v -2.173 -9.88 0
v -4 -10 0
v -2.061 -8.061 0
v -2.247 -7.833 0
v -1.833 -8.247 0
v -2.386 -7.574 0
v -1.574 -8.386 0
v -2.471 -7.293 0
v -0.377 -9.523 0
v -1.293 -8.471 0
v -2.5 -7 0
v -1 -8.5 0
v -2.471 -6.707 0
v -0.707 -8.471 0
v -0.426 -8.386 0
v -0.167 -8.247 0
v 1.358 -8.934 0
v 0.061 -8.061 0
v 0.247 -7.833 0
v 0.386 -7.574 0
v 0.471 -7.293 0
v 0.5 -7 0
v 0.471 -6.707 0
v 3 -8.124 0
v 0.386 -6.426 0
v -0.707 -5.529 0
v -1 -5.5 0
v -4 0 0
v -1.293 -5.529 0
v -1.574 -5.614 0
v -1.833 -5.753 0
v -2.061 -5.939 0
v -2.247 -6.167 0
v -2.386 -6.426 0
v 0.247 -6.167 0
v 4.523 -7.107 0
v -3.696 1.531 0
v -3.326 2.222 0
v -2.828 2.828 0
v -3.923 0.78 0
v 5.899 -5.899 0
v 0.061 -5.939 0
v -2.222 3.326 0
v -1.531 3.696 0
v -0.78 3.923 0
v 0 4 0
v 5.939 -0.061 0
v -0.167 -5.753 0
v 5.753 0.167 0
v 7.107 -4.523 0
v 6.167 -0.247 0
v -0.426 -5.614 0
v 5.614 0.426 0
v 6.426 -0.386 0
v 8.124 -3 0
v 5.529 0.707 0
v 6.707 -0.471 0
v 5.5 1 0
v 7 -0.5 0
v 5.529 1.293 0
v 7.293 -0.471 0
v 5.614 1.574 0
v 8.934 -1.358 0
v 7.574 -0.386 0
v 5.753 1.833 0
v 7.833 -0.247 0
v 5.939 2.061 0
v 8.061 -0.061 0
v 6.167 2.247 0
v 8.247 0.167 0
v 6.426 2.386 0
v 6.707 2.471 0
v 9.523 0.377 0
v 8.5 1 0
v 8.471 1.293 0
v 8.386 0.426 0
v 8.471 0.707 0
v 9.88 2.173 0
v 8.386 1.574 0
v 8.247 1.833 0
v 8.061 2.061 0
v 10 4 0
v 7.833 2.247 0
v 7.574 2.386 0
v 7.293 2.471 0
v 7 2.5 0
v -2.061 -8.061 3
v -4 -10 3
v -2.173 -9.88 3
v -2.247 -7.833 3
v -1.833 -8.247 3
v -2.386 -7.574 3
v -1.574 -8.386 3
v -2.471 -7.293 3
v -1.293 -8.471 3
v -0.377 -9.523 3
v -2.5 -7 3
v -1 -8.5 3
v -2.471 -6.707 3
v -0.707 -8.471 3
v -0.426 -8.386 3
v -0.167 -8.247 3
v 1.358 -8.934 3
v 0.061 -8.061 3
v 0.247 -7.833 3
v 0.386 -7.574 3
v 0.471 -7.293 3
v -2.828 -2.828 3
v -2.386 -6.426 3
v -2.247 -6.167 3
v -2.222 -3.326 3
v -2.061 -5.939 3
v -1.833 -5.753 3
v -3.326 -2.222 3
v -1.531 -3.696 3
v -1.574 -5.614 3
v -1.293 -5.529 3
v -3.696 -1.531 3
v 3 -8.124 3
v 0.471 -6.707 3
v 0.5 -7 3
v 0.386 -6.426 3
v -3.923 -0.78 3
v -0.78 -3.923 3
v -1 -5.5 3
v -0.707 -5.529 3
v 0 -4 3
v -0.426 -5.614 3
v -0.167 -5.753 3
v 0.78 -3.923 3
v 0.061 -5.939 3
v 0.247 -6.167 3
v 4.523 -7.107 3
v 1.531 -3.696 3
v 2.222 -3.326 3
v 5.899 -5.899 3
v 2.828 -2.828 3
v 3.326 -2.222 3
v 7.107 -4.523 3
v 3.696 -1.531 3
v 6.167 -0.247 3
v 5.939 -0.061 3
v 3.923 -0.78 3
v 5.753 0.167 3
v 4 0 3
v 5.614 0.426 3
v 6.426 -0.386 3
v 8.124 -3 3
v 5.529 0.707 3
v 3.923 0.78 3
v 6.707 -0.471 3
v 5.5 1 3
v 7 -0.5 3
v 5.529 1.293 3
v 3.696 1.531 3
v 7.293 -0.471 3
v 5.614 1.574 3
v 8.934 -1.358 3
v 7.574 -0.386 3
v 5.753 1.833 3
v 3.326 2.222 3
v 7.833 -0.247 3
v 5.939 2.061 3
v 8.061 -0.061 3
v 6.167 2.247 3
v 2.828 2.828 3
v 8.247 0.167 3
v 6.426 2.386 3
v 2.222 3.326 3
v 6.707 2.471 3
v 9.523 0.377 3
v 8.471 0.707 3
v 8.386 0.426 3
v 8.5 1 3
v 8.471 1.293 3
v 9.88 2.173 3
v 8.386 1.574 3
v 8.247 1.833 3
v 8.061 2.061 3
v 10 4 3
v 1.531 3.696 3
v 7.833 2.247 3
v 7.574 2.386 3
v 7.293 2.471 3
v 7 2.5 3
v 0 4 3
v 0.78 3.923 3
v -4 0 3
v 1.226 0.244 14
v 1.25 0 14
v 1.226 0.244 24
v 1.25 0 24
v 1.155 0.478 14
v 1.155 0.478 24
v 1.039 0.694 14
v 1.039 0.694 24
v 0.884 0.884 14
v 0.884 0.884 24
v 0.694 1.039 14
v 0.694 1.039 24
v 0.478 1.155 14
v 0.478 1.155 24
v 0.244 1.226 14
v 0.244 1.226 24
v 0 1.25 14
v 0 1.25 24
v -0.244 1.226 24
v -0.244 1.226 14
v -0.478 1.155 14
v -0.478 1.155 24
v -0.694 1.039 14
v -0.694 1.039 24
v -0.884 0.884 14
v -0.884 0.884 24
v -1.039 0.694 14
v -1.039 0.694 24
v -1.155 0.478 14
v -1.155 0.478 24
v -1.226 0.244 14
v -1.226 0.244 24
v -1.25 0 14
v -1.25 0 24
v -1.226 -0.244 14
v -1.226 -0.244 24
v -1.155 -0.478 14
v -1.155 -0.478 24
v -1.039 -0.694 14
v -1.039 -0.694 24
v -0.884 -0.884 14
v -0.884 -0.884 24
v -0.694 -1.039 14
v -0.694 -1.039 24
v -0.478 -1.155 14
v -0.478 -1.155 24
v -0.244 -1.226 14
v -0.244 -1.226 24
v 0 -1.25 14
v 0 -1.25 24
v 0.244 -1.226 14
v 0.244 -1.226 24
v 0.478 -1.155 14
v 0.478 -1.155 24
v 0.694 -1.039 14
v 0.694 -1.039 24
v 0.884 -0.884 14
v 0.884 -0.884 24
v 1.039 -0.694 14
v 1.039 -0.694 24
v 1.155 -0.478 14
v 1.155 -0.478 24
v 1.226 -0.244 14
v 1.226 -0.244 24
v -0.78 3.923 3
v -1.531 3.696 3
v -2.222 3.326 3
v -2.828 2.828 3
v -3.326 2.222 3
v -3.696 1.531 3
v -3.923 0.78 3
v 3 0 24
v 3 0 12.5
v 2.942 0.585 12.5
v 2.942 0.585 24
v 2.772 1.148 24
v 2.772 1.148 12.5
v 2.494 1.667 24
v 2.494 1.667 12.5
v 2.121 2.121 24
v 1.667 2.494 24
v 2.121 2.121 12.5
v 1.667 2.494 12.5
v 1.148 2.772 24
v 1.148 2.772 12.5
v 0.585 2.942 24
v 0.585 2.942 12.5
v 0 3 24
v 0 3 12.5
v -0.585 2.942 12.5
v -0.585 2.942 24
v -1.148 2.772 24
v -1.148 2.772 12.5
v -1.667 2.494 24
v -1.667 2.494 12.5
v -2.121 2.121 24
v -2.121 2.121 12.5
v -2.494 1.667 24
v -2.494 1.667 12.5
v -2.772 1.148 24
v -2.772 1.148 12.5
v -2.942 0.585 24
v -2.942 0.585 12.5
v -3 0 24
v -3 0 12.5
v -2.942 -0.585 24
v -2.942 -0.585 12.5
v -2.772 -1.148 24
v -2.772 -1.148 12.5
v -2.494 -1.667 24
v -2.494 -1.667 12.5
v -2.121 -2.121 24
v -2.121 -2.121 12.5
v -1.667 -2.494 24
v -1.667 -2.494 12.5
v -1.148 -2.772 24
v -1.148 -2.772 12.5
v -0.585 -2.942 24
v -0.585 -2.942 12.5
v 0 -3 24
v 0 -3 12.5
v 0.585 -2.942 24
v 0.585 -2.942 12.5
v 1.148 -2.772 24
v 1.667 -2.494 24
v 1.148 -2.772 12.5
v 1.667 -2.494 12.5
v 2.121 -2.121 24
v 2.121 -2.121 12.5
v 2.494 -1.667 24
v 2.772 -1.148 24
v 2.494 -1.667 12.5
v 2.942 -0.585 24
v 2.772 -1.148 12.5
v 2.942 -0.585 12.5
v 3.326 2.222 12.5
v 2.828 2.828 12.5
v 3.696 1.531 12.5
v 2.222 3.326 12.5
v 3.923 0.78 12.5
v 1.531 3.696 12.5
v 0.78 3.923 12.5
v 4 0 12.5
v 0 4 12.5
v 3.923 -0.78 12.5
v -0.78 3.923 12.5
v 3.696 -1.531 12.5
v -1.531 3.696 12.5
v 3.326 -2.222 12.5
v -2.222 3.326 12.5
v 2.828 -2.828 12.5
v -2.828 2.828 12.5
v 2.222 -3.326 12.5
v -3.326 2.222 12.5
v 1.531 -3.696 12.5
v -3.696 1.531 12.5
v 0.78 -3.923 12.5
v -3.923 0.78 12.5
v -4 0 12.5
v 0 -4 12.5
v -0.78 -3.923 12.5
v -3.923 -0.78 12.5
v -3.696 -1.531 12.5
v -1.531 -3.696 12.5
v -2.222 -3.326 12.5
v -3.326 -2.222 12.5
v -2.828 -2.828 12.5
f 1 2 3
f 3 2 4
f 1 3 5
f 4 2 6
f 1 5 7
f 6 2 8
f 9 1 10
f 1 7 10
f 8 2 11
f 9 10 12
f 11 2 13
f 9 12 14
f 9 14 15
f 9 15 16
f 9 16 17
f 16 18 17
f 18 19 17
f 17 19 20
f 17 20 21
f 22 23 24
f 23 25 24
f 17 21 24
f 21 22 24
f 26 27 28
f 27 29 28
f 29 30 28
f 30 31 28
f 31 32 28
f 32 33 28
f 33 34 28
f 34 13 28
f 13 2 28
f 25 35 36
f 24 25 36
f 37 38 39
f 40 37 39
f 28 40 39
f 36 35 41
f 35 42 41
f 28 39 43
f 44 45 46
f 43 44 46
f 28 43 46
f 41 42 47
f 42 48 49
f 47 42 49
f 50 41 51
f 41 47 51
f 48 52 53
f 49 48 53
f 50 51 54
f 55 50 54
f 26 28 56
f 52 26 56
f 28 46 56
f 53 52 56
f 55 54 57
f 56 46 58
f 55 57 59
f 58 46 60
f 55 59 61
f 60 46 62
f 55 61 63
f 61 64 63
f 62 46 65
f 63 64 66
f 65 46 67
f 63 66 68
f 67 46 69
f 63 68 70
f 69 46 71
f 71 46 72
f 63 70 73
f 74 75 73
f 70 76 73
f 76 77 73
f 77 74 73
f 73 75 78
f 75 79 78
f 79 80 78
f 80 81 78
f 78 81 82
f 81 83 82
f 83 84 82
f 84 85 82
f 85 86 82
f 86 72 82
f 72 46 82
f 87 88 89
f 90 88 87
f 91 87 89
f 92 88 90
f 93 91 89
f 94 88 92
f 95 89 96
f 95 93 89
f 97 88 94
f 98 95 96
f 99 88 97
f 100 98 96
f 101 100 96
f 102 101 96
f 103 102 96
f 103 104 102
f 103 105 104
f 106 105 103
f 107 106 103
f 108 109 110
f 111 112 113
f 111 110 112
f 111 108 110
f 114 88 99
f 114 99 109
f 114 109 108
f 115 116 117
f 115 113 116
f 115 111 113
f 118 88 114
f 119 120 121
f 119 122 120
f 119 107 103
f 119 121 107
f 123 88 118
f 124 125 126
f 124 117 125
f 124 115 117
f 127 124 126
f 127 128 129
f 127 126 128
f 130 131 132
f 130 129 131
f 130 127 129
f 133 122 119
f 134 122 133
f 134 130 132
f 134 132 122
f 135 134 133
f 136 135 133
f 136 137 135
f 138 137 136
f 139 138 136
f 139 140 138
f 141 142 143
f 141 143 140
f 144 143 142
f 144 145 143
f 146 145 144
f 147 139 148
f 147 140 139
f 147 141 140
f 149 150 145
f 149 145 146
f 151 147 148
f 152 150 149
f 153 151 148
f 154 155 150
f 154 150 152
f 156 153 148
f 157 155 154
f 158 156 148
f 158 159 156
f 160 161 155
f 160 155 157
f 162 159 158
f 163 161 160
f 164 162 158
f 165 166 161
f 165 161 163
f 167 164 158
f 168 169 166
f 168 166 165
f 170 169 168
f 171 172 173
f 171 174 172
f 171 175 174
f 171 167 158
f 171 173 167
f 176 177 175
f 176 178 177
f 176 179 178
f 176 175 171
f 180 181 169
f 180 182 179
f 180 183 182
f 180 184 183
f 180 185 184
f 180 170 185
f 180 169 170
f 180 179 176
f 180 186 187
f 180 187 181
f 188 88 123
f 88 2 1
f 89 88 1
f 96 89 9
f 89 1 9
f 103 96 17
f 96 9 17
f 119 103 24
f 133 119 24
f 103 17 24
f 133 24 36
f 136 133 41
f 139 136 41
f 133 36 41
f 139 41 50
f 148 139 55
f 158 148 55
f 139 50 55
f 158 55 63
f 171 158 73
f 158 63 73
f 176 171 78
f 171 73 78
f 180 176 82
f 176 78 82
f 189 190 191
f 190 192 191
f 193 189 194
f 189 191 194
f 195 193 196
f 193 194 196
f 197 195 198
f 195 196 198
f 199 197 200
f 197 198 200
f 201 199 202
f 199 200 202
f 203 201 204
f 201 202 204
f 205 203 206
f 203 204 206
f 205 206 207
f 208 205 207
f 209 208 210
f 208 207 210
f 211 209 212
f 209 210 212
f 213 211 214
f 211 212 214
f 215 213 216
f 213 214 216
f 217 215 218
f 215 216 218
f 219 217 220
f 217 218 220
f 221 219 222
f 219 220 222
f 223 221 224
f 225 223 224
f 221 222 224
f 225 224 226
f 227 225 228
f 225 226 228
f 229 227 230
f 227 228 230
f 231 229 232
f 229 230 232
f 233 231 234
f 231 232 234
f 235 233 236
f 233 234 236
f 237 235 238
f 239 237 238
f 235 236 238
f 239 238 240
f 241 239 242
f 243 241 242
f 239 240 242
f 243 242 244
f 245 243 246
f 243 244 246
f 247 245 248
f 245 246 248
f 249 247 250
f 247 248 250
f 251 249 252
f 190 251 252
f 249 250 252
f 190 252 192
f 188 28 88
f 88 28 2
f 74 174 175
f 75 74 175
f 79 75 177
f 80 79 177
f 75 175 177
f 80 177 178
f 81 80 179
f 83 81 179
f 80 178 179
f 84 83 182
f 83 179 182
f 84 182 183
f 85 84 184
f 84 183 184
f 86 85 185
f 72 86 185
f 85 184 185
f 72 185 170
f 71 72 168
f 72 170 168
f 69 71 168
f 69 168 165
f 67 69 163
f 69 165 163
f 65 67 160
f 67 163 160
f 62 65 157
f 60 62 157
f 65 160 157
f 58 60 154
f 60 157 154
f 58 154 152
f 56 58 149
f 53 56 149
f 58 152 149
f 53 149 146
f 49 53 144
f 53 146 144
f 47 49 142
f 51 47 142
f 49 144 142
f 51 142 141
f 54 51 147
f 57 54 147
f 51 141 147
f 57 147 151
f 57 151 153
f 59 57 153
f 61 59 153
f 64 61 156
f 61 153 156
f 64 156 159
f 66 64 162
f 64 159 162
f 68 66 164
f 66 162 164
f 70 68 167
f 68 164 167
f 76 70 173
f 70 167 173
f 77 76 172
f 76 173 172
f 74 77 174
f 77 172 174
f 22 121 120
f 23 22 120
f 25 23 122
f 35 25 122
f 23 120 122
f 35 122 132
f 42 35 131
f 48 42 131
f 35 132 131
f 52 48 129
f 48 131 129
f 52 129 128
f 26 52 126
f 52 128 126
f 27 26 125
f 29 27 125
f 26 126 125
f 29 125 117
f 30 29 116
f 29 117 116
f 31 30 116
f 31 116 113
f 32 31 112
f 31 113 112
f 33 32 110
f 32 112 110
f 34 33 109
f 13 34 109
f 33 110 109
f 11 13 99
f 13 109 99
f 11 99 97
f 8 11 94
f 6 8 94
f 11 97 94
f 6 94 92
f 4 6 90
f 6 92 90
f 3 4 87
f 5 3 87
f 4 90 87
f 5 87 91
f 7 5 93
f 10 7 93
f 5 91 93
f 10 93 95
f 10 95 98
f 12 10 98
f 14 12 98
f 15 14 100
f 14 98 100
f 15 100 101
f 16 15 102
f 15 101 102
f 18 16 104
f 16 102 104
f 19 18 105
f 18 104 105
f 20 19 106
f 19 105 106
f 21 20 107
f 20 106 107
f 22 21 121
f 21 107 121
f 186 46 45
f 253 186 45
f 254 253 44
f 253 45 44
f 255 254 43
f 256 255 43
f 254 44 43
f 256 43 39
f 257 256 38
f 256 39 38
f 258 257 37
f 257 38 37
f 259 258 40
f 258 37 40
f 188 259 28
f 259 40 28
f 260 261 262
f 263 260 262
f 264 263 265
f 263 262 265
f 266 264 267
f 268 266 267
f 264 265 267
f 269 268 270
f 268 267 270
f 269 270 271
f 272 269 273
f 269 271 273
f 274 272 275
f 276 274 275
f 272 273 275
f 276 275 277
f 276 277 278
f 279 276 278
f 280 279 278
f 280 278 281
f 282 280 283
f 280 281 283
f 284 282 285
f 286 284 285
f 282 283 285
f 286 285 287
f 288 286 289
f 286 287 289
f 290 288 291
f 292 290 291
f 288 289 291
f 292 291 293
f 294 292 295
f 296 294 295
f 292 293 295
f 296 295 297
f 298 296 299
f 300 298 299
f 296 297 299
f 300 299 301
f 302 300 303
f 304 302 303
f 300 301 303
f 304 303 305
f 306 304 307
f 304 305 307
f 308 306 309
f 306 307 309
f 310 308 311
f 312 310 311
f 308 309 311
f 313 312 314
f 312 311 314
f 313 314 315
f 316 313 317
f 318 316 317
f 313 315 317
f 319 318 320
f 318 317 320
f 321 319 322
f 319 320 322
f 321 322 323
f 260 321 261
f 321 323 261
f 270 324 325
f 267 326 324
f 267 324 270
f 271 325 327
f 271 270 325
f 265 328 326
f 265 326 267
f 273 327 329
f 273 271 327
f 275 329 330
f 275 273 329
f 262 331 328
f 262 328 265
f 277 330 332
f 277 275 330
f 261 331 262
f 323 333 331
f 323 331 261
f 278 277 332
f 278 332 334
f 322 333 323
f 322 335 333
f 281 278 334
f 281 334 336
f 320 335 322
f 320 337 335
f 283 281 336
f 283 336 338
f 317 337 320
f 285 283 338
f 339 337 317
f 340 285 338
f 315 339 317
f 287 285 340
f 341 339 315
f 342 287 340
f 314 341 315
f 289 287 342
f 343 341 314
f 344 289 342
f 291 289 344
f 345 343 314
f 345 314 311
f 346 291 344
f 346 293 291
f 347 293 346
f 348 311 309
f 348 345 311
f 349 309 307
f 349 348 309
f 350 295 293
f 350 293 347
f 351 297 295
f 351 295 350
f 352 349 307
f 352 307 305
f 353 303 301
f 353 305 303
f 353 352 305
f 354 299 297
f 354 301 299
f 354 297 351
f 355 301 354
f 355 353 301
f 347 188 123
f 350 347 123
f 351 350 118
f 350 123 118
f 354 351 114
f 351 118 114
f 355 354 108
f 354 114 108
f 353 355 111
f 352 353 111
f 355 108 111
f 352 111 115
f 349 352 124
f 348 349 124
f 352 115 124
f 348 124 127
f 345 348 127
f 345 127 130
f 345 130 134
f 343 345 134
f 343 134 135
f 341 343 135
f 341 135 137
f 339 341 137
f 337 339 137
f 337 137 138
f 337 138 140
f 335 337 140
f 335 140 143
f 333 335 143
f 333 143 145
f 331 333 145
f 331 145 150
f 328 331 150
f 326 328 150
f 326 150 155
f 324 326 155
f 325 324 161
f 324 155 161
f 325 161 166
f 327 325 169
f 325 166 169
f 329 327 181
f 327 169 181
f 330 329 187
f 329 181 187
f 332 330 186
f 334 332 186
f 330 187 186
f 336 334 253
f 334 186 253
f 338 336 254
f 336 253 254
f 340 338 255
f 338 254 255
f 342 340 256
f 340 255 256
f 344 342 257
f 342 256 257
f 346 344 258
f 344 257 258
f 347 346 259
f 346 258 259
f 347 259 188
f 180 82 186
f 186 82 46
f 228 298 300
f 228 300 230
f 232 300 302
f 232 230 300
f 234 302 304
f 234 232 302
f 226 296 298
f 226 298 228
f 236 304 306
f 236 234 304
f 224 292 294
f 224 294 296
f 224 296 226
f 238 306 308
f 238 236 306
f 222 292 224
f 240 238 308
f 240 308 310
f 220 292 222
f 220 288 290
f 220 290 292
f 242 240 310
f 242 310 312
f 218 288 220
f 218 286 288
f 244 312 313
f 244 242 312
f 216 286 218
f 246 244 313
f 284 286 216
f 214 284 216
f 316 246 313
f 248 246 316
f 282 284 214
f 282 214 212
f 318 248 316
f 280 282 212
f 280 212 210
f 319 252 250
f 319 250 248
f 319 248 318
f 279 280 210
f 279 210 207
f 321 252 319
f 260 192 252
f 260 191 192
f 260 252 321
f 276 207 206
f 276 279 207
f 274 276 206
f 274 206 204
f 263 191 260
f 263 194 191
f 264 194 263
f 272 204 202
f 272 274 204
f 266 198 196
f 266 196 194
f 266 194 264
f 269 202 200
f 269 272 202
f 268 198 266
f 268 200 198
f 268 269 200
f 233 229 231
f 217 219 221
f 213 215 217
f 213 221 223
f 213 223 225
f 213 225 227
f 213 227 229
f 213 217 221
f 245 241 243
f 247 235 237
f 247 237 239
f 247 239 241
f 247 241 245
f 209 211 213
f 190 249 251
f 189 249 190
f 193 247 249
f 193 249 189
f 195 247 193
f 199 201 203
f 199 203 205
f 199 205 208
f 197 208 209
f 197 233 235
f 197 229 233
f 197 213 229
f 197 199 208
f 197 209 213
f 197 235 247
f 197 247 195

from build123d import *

# Parameters (mm, degrees)
EXTRUDE1_DEPTH        = 3
SKETCH2_R             = 4
EXTRUDE2_DEPTH        = 9.5
SKETCH3_R             = 3
EXTRUDE3_DEPTH        = 11.5
SKETCH4_R             = 1.25
EXTRUDE4_DEPTH        = 10
SKETCH5_R             = 1.5
EXTRUDE5_DEPTH        = 3
M3_TAPPED_HOLE1_D     = 2.5
M3_TAPPED_HOLE1_DEPTH = 7.5
M3_TAPPED_HOLE1_TIP   = 0.751075774


with BuildPart() as part:
    # Sketch1 → Extrude1 (new body)
    with BuildSketch(Plane.XY):
        with BuildLine():
            Line((10, 4), (0, 4))
            ThreePointArc((0, 4), (-2.828427125, 2.828427125), (-4, 0))
            Line((-4, 0), (-4, -10))
            ThreePointArc((-4, -10), (5.899494937, -5.899494937), (10, 4))
        make_face()
    extrude(amount=EXTRUDE1_DEPTH)

    # Sketch2 → Extrude2 (add)
    with BuildSketch(Plane.XY.offset(3)):
        with Locations(Location((0, 0, 0), (0, 0, 180))):
            Circle(SKETCH2_R)
    extrude(amount=EXTRUDE2_DEPTH)

    # Sketch3 → Extrude3 (add)
    with BuildSketch(Plane.XY.offset(12.5)):
        Circle(SKETCH3_R)
    extrude(amount=EXTRUDE3_DEPTH)

    # Sketch4 → Extrude4 (cut)
    with BuildSketch(Plane.XY.offset(24)):
        Circle(SKETCH4_R)
    extrude(amount=-EXTRUDE4_DEPTH, mode=Mode.SUBTRACT)

    # Sketch5 → Extrude5 (cut)
    with BuildSketch(Plane.XY.offset(3)):
        with Locations((7, 1)):
            Circle(SKETCH5_R)
        with Locations((-1, -7)):
            Circle(SKETCH5_R)
    extrude(amount=-EXTRUDE5_DEPTH, mode=Mode.SUBTRACT)

    # M3 Tapped Hole1
    with Locations(Plane.XY.offset(24)):
        with Locations((0, 0)):
            Hole(M3_TAPPED_HOLE1_D / 2, depth=M3_TAPPED_HOLE1_DEPTH)
            with Locations((0, 0, -(M3_TAPPED_HOLE1_DEPTH + M3_TAPPED_HOLE1_TIP / 2))):  # 118° drill point
                Cone(0, M3_TAPPED_HOLE1_D / 2, M3_TAPPED_HOLE1_TIP, mode=Mode.SUBTRACT)


solid = part.part
